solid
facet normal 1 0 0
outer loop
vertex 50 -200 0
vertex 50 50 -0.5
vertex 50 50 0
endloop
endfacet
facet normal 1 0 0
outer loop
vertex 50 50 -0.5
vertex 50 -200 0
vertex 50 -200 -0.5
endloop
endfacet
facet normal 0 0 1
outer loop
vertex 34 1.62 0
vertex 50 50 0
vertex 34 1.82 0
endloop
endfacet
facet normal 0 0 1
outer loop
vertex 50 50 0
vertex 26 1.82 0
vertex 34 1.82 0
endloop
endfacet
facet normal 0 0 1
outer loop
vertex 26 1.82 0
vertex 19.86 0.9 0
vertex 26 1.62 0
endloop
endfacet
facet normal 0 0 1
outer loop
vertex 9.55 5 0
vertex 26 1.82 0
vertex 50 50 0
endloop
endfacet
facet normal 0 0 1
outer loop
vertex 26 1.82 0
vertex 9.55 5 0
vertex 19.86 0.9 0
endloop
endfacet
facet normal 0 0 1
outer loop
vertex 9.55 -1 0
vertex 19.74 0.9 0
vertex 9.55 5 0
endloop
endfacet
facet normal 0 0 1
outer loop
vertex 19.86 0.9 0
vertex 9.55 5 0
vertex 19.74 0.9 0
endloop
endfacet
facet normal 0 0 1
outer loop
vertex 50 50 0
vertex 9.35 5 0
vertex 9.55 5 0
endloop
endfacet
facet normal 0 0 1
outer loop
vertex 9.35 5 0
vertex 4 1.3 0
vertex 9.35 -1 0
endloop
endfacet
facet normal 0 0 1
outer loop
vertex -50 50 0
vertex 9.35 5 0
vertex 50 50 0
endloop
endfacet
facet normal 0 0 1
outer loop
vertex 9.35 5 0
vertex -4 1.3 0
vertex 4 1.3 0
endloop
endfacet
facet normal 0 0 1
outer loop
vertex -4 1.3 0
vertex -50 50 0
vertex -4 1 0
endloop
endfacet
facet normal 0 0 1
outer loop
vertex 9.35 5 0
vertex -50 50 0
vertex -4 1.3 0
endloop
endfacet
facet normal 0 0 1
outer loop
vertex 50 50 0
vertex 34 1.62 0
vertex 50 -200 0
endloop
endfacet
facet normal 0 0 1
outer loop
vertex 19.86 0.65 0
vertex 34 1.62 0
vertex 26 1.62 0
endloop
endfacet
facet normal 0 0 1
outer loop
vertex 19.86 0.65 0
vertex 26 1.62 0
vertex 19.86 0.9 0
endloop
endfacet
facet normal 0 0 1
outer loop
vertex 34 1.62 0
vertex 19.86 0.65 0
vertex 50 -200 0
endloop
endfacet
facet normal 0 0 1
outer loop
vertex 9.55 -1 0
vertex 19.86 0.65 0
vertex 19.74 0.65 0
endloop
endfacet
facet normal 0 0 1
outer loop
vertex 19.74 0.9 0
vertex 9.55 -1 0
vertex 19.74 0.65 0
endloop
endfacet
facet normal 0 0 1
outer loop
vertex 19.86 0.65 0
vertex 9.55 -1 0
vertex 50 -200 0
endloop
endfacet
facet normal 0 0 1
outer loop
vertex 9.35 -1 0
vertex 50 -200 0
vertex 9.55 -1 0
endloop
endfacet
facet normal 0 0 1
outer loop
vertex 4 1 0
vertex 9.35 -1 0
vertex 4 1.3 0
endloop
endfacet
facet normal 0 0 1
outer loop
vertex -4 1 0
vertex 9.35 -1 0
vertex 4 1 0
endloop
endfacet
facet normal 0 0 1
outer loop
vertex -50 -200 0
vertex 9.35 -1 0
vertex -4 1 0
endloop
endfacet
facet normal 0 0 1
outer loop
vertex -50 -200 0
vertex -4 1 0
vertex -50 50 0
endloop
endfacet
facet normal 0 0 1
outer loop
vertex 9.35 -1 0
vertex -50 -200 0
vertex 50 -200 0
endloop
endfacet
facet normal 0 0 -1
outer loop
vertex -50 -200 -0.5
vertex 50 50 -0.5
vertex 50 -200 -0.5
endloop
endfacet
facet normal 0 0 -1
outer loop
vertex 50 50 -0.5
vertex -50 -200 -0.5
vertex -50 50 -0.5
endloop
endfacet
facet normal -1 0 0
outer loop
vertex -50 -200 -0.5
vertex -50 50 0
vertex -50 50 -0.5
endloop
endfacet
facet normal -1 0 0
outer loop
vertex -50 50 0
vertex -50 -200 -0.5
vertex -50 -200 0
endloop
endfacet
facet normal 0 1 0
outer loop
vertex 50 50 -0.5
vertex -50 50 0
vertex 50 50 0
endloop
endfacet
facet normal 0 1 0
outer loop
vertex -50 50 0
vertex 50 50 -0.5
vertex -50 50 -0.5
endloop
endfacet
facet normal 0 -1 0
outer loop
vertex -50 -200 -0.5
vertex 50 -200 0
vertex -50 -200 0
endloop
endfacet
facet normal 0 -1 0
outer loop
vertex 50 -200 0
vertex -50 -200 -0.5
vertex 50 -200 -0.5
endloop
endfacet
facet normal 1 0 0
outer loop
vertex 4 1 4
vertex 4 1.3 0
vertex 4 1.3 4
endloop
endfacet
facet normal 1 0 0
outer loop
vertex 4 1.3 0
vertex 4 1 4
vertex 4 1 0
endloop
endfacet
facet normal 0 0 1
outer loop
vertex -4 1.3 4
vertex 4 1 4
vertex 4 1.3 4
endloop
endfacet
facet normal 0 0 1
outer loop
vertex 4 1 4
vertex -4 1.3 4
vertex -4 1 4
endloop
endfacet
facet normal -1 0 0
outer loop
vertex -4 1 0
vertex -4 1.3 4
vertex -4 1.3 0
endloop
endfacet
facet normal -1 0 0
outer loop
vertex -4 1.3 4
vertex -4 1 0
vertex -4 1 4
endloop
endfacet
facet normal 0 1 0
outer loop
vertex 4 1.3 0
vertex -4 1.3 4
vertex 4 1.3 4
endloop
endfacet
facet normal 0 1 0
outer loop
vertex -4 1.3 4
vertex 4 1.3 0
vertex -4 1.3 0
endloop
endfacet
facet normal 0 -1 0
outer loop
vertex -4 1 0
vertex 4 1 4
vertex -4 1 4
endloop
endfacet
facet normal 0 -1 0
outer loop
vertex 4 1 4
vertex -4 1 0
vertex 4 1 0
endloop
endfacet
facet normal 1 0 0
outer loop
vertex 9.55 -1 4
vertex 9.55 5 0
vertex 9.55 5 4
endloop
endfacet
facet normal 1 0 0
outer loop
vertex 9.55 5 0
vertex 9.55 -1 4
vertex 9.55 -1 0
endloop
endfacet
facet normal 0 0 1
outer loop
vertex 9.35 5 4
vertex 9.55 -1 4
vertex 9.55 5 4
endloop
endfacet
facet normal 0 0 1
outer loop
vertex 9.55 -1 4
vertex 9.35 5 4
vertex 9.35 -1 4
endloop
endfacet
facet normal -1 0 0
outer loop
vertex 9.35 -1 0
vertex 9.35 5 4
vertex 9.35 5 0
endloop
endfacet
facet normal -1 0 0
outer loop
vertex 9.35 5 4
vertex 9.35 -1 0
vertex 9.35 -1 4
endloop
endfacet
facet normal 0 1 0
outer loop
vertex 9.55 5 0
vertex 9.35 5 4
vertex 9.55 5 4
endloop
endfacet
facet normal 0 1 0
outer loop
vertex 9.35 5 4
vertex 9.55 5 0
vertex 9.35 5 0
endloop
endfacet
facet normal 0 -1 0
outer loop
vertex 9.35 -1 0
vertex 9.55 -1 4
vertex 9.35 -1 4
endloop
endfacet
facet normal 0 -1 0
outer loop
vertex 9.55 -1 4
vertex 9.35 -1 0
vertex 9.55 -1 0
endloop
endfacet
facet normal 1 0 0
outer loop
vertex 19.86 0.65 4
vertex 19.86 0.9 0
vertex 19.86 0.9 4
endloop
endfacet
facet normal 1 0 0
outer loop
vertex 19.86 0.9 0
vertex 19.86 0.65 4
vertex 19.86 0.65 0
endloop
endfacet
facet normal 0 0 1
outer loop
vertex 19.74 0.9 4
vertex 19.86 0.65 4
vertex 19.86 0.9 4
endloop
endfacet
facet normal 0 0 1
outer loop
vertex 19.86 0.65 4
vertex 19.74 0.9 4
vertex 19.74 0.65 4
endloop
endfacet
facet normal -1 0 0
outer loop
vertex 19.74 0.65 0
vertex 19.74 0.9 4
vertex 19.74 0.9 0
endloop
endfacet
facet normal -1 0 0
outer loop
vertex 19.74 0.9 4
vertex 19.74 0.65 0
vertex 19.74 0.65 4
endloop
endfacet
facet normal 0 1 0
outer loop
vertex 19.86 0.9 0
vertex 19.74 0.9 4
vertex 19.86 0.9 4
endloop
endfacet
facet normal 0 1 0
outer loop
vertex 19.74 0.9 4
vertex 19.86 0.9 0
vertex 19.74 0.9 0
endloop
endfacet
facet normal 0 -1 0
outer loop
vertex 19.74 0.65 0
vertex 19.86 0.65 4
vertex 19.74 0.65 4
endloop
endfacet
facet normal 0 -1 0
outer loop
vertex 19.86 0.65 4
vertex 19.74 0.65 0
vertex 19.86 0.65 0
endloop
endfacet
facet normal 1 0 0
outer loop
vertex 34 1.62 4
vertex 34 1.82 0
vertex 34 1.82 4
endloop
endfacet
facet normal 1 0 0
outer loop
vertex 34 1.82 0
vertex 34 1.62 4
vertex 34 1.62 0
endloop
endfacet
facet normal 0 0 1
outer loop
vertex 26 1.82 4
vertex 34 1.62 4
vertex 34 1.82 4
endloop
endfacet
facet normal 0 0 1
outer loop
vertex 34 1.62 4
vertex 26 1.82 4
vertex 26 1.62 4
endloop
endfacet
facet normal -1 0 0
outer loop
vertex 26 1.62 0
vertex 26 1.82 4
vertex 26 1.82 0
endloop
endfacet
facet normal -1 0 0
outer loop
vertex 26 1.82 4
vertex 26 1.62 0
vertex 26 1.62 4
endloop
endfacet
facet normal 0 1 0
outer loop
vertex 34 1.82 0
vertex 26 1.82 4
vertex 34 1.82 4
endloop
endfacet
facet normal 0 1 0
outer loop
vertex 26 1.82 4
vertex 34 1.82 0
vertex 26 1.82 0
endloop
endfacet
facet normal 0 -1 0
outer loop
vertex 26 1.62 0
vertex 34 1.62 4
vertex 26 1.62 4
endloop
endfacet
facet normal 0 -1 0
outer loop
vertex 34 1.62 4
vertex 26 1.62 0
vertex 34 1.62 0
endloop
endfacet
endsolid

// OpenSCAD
// Deterministic spring-arm fixture. SCAD [x,y,z] maps to engine [x,z,-y].
// Includes the default NextDayz spawn (-30, 177) and four isolated probe lanes.
color([0.24, 0.30, 0.22])
    translate([-50, -200, -0.5]) cube([100, 250, 0.5]);

// A wall closer than the fixed third-person distance (1.5 m).
color([0.60, 0.38, 0.25])
    translate([-4, 1, 0]) cube([8, 0.3, 4]);

// Side wall: only the shoulder offset takes the camera through this wall.
color([0.40, 0.48, 0.60])
    translate([9.35, -1, 0]) cube([0.2, 6, 4]);

// The centre ray misses this thin post; the near-plane edge must catch it.
color([0.75, 0.64, 0.24])
    translate([19.74, 0.65, 0]) cube([0.12, 0.25, 4]);

// Just beyond the desired lens position: the clearance still needs to pull in.
color([0.50, 0.35, 0.55])
    translate([26, 1.62, 0]) cube([8, 0.2, 4]);
